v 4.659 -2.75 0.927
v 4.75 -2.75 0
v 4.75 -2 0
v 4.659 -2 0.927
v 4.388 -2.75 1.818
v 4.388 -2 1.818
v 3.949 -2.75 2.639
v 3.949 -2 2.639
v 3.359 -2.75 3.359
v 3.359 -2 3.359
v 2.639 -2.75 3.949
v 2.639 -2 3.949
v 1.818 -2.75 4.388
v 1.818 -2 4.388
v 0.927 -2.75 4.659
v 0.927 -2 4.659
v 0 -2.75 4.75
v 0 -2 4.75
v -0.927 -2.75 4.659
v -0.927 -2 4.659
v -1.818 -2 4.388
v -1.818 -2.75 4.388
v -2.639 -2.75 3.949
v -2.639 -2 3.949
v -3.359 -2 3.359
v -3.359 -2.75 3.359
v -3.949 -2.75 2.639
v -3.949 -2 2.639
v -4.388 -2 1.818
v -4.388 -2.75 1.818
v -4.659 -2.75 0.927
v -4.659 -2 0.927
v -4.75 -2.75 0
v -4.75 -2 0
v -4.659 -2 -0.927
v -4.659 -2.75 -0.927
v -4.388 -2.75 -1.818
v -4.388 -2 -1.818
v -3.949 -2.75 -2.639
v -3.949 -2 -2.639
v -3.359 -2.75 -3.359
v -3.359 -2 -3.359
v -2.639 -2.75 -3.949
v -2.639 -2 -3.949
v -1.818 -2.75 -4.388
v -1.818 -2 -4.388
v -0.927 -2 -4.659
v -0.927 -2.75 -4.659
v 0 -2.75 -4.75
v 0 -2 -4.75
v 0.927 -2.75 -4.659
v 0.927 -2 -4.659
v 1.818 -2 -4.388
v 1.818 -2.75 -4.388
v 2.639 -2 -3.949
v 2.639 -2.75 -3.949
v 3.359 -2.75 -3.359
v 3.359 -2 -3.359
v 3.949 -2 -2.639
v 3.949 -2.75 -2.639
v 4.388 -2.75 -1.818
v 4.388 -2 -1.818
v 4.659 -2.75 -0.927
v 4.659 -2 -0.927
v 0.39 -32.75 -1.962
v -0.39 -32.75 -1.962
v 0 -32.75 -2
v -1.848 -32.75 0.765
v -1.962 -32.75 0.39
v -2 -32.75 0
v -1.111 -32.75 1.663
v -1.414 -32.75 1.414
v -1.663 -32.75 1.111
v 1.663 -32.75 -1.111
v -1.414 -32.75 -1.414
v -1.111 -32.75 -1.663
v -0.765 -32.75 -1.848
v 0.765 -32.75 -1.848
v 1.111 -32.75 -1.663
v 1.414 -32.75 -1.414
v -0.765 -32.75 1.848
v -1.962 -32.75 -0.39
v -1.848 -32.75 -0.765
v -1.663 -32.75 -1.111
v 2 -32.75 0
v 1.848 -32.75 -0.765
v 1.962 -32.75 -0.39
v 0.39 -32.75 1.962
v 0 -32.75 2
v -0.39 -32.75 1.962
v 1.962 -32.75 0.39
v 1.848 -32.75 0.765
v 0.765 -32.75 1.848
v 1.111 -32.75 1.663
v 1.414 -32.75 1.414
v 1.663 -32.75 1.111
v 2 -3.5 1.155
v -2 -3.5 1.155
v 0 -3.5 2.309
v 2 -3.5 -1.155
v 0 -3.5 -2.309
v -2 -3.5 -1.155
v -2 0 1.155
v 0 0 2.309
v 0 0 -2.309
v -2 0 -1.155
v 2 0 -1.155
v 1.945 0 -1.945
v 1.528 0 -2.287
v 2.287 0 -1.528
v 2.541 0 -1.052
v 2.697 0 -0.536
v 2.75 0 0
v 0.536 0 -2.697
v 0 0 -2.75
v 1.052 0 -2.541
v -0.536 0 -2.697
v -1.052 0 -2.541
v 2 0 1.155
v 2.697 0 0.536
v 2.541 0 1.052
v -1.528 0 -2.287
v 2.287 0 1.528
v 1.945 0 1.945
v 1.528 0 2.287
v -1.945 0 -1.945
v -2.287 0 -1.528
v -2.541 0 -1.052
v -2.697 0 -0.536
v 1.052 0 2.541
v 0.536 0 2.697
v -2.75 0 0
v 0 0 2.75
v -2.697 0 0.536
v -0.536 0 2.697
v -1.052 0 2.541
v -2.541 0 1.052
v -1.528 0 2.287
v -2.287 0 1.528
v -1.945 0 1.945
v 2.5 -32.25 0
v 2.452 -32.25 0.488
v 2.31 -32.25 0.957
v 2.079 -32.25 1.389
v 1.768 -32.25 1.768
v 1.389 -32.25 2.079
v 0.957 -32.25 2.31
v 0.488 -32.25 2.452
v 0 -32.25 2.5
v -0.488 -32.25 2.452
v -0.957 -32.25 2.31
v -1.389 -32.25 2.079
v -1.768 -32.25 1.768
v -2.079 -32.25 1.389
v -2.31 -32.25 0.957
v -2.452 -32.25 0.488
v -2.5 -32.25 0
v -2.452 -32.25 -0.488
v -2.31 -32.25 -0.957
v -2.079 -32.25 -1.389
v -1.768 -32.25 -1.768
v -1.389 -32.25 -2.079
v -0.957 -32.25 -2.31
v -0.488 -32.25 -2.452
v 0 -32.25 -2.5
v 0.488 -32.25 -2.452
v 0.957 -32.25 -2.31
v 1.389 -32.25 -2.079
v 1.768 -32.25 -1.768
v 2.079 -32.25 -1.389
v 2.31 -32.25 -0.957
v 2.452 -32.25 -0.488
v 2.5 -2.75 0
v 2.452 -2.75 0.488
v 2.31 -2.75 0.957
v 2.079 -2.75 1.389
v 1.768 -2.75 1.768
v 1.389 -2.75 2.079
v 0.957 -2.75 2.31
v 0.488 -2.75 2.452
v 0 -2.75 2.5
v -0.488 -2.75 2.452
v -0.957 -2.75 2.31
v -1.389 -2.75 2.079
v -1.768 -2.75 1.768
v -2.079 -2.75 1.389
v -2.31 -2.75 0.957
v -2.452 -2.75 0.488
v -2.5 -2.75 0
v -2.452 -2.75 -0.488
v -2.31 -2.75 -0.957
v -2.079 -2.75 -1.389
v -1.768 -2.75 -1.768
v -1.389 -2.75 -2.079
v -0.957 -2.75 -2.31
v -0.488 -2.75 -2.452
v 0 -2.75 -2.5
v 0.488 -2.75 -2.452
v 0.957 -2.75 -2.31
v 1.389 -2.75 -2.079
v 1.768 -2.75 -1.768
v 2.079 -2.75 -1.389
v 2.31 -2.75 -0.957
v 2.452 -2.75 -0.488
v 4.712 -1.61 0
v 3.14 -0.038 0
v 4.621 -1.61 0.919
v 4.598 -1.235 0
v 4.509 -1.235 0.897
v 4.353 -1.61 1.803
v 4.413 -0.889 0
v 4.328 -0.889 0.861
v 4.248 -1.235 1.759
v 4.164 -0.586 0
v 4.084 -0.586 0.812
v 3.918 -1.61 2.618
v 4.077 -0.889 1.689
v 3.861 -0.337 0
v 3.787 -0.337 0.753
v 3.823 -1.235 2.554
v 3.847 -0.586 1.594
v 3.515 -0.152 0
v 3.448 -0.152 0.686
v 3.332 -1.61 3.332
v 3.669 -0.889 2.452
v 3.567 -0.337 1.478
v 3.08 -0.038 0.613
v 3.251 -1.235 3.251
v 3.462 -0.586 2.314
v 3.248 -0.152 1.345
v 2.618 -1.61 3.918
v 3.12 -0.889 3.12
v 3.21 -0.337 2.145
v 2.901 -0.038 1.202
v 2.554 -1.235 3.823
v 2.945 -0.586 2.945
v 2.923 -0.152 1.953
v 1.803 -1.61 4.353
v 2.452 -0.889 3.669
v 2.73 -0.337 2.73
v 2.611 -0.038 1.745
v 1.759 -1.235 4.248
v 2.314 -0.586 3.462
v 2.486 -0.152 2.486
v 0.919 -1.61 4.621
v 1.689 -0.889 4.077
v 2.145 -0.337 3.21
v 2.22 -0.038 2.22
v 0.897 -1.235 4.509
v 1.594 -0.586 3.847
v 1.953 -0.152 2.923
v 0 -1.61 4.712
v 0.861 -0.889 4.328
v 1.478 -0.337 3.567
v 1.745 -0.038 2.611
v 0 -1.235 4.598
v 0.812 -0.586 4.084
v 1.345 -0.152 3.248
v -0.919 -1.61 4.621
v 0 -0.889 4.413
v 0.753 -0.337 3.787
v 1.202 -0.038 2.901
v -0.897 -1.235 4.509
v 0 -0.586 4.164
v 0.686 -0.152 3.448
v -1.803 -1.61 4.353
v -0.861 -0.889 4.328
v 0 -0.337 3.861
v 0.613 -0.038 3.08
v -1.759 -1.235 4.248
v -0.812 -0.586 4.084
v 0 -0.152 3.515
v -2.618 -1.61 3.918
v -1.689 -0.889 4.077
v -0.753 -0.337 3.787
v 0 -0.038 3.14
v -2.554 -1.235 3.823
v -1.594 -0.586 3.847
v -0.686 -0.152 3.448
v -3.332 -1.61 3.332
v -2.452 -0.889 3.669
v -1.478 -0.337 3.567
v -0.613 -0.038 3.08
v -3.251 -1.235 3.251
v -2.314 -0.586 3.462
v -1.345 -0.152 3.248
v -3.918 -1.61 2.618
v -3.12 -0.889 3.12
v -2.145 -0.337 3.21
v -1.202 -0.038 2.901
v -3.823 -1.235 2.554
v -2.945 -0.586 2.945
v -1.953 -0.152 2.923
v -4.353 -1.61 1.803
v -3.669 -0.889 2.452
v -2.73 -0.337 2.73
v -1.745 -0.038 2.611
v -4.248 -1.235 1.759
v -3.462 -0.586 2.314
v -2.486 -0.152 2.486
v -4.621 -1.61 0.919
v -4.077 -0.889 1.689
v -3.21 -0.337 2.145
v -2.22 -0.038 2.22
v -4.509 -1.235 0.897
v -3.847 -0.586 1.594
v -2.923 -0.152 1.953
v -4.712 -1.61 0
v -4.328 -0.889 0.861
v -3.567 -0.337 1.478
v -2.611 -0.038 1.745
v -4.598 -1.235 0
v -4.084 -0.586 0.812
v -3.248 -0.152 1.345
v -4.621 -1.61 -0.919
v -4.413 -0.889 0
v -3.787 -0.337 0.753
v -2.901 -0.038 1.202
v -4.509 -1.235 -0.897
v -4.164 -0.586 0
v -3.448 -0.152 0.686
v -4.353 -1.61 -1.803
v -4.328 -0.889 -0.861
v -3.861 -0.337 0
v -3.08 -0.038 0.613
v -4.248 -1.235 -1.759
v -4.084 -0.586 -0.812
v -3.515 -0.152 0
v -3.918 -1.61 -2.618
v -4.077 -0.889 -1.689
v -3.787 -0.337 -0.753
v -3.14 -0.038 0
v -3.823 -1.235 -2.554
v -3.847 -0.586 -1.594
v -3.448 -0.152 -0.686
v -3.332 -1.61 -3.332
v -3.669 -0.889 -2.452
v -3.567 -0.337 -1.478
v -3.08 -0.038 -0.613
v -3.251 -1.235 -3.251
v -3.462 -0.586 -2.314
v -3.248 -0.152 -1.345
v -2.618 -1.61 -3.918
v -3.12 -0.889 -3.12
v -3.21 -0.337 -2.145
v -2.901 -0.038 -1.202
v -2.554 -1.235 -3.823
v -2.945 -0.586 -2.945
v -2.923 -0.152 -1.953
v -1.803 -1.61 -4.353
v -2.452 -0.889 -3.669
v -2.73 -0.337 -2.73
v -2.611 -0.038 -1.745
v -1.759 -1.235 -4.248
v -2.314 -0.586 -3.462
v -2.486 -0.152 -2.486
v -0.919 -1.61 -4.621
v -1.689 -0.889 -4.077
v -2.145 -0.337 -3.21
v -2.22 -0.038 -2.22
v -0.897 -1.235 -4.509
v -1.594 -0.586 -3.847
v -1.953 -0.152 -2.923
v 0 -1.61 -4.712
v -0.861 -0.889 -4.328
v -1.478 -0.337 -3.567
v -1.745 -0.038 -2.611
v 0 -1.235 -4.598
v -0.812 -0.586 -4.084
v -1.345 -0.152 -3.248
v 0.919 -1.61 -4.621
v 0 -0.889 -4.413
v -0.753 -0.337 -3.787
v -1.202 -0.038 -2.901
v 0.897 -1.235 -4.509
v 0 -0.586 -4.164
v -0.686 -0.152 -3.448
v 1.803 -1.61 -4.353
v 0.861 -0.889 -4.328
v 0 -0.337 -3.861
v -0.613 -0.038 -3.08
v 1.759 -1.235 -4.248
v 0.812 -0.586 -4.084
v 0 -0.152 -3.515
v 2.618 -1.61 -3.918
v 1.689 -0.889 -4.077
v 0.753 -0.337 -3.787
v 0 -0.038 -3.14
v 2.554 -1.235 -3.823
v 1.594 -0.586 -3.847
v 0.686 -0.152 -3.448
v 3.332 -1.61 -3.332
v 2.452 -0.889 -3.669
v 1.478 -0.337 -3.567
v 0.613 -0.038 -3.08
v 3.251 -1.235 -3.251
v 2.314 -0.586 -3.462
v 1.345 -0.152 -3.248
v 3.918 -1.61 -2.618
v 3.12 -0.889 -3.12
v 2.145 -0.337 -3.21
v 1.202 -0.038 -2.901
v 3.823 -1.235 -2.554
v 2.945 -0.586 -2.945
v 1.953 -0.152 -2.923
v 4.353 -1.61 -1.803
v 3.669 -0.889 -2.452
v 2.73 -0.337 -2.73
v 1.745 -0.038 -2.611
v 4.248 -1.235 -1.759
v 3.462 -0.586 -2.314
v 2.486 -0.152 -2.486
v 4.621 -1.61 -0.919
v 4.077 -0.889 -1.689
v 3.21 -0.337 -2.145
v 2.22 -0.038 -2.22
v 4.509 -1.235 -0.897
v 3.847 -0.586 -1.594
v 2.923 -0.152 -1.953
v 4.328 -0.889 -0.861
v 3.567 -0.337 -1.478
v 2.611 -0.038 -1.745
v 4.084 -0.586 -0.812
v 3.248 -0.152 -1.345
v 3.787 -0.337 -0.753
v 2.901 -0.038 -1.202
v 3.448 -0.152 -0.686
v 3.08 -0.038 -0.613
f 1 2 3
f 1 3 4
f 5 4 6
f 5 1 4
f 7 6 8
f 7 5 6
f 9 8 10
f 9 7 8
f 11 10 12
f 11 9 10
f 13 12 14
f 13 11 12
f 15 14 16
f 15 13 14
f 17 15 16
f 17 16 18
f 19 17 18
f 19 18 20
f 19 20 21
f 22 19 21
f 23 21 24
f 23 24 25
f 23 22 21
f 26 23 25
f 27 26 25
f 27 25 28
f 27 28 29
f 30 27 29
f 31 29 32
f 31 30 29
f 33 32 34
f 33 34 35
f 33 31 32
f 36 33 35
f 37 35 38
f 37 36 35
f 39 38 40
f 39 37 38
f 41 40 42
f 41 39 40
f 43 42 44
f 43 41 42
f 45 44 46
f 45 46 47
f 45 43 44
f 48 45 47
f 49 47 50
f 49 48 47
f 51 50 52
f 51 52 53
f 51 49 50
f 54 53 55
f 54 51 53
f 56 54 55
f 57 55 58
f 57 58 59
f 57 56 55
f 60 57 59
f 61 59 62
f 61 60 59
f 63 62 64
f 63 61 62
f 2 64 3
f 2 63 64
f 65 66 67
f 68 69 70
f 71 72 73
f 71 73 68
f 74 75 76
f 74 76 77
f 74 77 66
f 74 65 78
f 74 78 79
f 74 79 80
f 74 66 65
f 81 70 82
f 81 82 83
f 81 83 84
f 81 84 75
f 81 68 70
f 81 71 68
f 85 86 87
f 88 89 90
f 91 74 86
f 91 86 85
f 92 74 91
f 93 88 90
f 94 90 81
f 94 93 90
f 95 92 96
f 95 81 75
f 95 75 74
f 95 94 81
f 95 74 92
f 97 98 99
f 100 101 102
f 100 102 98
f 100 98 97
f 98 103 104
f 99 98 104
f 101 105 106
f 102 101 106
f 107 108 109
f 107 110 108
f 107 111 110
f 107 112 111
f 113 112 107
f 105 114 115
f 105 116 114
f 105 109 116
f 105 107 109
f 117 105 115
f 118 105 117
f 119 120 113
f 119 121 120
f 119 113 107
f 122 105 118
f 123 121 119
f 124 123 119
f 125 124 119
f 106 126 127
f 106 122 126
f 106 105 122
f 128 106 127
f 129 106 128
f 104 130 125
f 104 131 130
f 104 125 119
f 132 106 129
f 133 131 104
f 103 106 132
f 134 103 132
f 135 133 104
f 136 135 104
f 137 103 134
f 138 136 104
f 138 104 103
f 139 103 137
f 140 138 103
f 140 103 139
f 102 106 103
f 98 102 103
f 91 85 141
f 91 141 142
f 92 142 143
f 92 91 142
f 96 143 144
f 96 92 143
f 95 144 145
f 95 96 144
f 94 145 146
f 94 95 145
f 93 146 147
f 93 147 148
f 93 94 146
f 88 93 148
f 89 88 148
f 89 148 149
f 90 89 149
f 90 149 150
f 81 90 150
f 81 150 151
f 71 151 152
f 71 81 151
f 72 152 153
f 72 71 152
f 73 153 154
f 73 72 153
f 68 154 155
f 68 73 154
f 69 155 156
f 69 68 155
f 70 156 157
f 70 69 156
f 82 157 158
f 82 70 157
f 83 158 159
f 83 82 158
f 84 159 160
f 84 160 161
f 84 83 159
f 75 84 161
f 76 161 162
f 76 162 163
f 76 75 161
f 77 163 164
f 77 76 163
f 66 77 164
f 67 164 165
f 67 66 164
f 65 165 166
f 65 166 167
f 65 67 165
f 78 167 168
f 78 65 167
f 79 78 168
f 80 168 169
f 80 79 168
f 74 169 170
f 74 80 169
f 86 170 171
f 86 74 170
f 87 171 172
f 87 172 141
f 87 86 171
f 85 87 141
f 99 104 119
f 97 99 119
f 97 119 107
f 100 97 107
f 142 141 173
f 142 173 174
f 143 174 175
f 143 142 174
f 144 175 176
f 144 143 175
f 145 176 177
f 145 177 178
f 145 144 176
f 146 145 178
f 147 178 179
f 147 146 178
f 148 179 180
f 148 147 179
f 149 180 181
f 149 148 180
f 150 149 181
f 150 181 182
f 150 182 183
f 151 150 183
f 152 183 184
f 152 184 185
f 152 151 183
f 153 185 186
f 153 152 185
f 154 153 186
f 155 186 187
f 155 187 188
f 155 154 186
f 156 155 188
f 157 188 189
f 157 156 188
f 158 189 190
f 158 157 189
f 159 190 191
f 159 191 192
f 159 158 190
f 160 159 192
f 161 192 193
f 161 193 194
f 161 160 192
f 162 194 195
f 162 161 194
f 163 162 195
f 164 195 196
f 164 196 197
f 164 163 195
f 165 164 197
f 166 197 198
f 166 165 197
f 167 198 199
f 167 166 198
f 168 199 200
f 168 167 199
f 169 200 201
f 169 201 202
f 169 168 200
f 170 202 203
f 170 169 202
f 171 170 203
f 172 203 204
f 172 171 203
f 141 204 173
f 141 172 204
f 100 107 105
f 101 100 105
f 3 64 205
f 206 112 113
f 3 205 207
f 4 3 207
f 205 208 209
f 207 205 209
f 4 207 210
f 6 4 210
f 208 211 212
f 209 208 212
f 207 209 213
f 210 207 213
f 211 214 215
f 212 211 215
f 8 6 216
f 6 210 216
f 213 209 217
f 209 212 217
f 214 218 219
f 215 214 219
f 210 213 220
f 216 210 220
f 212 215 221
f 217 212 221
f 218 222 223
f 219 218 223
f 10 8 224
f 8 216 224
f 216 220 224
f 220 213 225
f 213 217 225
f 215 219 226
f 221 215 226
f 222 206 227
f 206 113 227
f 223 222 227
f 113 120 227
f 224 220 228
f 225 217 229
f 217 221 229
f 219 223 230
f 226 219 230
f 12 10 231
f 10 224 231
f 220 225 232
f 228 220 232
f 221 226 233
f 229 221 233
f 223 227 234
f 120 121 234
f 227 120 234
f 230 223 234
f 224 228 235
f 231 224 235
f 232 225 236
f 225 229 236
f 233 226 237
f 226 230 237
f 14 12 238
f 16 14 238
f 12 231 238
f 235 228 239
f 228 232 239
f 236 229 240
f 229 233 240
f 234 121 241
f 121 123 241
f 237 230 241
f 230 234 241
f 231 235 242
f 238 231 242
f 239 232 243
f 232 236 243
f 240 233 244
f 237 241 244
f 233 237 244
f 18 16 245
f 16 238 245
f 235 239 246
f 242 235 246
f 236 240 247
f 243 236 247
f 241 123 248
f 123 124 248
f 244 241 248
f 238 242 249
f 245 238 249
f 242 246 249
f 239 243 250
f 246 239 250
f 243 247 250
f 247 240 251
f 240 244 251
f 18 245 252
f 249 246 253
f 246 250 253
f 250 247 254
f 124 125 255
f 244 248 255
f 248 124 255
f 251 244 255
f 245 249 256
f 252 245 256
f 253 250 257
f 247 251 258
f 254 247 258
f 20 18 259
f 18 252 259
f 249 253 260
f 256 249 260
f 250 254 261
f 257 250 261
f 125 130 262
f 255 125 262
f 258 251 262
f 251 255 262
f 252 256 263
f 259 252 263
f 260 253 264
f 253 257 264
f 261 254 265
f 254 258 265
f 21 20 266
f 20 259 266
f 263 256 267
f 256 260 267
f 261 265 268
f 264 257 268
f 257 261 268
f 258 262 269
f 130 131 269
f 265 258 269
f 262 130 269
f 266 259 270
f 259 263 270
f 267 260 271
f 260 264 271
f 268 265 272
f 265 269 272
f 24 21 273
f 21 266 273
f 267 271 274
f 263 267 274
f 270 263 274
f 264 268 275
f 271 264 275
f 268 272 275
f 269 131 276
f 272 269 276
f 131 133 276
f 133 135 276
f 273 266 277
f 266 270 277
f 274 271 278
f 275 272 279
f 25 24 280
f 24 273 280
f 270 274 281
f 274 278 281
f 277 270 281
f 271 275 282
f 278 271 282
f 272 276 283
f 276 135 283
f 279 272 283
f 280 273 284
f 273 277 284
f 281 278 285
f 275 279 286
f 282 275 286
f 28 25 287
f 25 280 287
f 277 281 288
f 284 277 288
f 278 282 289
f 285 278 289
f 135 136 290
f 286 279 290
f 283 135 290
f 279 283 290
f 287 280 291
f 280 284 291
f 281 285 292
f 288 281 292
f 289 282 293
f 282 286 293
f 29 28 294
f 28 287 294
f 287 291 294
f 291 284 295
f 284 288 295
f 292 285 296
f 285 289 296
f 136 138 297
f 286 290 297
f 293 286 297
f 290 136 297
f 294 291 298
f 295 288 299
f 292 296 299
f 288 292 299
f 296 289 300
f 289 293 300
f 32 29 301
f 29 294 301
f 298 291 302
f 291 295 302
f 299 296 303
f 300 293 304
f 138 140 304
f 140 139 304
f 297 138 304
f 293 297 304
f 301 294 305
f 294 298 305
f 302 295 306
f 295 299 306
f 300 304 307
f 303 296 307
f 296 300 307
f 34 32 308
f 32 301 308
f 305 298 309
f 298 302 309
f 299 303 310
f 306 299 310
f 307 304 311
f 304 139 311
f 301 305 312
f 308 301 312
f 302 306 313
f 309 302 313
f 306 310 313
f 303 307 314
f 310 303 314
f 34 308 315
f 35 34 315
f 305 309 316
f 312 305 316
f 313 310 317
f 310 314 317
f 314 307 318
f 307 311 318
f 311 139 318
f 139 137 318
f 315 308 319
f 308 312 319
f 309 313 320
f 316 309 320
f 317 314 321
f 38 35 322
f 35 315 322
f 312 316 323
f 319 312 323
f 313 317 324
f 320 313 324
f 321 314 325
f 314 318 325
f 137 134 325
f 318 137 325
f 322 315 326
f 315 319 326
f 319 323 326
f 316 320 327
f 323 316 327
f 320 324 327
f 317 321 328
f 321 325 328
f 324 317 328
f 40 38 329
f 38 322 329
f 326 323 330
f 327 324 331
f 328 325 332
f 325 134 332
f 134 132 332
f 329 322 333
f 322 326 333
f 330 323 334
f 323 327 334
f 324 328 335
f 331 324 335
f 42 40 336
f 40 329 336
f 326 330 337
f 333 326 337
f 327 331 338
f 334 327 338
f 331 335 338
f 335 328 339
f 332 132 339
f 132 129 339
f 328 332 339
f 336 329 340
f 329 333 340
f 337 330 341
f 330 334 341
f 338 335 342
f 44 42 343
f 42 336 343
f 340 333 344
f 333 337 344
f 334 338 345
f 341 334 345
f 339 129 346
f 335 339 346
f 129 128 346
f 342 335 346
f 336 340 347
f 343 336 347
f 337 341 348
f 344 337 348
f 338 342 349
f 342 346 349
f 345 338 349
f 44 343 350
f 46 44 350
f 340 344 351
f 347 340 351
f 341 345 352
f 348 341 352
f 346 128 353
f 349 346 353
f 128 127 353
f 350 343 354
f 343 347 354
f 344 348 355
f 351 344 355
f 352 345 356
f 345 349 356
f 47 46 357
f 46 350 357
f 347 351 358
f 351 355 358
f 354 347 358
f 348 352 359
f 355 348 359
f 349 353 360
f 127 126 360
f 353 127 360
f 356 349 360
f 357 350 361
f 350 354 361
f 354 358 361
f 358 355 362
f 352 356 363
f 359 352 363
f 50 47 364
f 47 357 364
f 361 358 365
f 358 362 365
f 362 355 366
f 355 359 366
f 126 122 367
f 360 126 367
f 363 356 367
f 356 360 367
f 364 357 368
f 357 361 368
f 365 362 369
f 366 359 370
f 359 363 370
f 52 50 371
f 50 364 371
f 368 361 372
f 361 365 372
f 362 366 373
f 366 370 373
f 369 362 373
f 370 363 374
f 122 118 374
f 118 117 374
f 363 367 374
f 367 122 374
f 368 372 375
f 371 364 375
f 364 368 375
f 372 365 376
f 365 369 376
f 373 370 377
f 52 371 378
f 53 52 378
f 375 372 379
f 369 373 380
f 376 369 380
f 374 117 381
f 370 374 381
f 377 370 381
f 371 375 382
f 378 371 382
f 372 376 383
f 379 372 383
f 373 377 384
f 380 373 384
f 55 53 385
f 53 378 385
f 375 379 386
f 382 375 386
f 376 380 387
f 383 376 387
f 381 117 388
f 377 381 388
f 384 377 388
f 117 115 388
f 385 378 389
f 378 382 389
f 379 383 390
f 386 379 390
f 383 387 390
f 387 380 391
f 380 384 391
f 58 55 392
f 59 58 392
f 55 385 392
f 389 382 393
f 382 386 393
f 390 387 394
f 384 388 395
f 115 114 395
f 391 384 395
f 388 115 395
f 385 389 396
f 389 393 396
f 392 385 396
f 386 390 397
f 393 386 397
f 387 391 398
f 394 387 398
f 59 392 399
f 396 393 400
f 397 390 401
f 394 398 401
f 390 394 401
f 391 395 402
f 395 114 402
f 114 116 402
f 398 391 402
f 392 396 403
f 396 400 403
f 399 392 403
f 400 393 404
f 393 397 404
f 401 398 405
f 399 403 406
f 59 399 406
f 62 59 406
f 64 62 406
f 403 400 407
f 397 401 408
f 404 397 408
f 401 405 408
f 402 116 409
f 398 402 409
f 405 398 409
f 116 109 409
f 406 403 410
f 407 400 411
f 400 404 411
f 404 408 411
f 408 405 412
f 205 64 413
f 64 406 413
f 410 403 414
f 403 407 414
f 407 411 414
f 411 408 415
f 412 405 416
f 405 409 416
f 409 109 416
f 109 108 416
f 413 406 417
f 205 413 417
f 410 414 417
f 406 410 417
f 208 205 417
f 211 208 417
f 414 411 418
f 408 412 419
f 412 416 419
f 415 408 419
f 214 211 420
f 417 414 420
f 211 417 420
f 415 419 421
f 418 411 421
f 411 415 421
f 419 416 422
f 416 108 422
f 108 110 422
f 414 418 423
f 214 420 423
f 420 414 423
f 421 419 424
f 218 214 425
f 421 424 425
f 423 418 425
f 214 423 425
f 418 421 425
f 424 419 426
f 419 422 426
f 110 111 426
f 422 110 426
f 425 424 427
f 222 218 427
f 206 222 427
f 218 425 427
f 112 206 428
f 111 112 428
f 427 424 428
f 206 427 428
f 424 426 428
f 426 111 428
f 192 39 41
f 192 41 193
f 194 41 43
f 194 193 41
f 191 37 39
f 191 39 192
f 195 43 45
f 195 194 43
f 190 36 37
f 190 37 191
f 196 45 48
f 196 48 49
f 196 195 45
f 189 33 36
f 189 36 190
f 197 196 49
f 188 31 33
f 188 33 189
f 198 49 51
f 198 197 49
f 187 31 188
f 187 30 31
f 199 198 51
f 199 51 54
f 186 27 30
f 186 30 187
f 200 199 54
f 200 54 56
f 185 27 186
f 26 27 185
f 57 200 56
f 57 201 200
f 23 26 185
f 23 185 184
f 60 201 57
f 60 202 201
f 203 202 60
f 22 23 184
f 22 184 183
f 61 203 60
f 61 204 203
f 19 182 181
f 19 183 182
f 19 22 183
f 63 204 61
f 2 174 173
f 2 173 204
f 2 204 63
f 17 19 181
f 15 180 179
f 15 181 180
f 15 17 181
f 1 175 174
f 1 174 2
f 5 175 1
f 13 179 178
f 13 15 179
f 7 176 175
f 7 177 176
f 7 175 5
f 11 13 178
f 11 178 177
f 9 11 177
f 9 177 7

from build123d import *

# Parameters (mm, degrees)
CORTAR_EXTRUIR1_DEPTH = 3.5
CHAFL_N1_SIZE         = 0.5
REDONDEO1_R           = 2


with BuildPart() as part:
    # Croquis1 → Revolución1 (revolve)
    with BuildSketch(Plane.XY):
        Polygon((0, 0), (4.75, 0), (4.75, -2.75), (2.5, -2.75), (2.5, -32.75), (0, -32.75), align=None)
    revolve(axis=Axis((0, 0, 0), (0, -1, 0)))

    # Croquis2 → Cortar-Extruir1 (cut)
    with BuildSketch(Plane(origin=(0, 0, 0), x_dir=(1, 0, 0), z_dir=(0, 1, 0))):
        Polygon((2, 1.154700538), (0, 2.309401077), (-2, 1.154700538), (-2, -1.154700538), (0, -2.309401077), (2, -1.154700538), align=None)
    extrude(amount=-CORTAR_EXTRUIR1_DEPTH, mode=Mode.SUBTRACT)

    # Chaflán1
    chafl_n1_edges = [part.edges().sort_by_distance(p)[0] for p in [
        (-2.5, -32.75, 0),
    ]]
    chamfer(chafl_n1_edges, length=CHAFL_N1_SIZE)

    # Redondeo1
    redondeo1_edges = [part.edges().sort_by_distance(p)[0] for p in [
        (-4.75, 0, 0),
    ]]
    fillet(redondeo1_edges, radius=REDONDEO1_R)


solid = part.part
